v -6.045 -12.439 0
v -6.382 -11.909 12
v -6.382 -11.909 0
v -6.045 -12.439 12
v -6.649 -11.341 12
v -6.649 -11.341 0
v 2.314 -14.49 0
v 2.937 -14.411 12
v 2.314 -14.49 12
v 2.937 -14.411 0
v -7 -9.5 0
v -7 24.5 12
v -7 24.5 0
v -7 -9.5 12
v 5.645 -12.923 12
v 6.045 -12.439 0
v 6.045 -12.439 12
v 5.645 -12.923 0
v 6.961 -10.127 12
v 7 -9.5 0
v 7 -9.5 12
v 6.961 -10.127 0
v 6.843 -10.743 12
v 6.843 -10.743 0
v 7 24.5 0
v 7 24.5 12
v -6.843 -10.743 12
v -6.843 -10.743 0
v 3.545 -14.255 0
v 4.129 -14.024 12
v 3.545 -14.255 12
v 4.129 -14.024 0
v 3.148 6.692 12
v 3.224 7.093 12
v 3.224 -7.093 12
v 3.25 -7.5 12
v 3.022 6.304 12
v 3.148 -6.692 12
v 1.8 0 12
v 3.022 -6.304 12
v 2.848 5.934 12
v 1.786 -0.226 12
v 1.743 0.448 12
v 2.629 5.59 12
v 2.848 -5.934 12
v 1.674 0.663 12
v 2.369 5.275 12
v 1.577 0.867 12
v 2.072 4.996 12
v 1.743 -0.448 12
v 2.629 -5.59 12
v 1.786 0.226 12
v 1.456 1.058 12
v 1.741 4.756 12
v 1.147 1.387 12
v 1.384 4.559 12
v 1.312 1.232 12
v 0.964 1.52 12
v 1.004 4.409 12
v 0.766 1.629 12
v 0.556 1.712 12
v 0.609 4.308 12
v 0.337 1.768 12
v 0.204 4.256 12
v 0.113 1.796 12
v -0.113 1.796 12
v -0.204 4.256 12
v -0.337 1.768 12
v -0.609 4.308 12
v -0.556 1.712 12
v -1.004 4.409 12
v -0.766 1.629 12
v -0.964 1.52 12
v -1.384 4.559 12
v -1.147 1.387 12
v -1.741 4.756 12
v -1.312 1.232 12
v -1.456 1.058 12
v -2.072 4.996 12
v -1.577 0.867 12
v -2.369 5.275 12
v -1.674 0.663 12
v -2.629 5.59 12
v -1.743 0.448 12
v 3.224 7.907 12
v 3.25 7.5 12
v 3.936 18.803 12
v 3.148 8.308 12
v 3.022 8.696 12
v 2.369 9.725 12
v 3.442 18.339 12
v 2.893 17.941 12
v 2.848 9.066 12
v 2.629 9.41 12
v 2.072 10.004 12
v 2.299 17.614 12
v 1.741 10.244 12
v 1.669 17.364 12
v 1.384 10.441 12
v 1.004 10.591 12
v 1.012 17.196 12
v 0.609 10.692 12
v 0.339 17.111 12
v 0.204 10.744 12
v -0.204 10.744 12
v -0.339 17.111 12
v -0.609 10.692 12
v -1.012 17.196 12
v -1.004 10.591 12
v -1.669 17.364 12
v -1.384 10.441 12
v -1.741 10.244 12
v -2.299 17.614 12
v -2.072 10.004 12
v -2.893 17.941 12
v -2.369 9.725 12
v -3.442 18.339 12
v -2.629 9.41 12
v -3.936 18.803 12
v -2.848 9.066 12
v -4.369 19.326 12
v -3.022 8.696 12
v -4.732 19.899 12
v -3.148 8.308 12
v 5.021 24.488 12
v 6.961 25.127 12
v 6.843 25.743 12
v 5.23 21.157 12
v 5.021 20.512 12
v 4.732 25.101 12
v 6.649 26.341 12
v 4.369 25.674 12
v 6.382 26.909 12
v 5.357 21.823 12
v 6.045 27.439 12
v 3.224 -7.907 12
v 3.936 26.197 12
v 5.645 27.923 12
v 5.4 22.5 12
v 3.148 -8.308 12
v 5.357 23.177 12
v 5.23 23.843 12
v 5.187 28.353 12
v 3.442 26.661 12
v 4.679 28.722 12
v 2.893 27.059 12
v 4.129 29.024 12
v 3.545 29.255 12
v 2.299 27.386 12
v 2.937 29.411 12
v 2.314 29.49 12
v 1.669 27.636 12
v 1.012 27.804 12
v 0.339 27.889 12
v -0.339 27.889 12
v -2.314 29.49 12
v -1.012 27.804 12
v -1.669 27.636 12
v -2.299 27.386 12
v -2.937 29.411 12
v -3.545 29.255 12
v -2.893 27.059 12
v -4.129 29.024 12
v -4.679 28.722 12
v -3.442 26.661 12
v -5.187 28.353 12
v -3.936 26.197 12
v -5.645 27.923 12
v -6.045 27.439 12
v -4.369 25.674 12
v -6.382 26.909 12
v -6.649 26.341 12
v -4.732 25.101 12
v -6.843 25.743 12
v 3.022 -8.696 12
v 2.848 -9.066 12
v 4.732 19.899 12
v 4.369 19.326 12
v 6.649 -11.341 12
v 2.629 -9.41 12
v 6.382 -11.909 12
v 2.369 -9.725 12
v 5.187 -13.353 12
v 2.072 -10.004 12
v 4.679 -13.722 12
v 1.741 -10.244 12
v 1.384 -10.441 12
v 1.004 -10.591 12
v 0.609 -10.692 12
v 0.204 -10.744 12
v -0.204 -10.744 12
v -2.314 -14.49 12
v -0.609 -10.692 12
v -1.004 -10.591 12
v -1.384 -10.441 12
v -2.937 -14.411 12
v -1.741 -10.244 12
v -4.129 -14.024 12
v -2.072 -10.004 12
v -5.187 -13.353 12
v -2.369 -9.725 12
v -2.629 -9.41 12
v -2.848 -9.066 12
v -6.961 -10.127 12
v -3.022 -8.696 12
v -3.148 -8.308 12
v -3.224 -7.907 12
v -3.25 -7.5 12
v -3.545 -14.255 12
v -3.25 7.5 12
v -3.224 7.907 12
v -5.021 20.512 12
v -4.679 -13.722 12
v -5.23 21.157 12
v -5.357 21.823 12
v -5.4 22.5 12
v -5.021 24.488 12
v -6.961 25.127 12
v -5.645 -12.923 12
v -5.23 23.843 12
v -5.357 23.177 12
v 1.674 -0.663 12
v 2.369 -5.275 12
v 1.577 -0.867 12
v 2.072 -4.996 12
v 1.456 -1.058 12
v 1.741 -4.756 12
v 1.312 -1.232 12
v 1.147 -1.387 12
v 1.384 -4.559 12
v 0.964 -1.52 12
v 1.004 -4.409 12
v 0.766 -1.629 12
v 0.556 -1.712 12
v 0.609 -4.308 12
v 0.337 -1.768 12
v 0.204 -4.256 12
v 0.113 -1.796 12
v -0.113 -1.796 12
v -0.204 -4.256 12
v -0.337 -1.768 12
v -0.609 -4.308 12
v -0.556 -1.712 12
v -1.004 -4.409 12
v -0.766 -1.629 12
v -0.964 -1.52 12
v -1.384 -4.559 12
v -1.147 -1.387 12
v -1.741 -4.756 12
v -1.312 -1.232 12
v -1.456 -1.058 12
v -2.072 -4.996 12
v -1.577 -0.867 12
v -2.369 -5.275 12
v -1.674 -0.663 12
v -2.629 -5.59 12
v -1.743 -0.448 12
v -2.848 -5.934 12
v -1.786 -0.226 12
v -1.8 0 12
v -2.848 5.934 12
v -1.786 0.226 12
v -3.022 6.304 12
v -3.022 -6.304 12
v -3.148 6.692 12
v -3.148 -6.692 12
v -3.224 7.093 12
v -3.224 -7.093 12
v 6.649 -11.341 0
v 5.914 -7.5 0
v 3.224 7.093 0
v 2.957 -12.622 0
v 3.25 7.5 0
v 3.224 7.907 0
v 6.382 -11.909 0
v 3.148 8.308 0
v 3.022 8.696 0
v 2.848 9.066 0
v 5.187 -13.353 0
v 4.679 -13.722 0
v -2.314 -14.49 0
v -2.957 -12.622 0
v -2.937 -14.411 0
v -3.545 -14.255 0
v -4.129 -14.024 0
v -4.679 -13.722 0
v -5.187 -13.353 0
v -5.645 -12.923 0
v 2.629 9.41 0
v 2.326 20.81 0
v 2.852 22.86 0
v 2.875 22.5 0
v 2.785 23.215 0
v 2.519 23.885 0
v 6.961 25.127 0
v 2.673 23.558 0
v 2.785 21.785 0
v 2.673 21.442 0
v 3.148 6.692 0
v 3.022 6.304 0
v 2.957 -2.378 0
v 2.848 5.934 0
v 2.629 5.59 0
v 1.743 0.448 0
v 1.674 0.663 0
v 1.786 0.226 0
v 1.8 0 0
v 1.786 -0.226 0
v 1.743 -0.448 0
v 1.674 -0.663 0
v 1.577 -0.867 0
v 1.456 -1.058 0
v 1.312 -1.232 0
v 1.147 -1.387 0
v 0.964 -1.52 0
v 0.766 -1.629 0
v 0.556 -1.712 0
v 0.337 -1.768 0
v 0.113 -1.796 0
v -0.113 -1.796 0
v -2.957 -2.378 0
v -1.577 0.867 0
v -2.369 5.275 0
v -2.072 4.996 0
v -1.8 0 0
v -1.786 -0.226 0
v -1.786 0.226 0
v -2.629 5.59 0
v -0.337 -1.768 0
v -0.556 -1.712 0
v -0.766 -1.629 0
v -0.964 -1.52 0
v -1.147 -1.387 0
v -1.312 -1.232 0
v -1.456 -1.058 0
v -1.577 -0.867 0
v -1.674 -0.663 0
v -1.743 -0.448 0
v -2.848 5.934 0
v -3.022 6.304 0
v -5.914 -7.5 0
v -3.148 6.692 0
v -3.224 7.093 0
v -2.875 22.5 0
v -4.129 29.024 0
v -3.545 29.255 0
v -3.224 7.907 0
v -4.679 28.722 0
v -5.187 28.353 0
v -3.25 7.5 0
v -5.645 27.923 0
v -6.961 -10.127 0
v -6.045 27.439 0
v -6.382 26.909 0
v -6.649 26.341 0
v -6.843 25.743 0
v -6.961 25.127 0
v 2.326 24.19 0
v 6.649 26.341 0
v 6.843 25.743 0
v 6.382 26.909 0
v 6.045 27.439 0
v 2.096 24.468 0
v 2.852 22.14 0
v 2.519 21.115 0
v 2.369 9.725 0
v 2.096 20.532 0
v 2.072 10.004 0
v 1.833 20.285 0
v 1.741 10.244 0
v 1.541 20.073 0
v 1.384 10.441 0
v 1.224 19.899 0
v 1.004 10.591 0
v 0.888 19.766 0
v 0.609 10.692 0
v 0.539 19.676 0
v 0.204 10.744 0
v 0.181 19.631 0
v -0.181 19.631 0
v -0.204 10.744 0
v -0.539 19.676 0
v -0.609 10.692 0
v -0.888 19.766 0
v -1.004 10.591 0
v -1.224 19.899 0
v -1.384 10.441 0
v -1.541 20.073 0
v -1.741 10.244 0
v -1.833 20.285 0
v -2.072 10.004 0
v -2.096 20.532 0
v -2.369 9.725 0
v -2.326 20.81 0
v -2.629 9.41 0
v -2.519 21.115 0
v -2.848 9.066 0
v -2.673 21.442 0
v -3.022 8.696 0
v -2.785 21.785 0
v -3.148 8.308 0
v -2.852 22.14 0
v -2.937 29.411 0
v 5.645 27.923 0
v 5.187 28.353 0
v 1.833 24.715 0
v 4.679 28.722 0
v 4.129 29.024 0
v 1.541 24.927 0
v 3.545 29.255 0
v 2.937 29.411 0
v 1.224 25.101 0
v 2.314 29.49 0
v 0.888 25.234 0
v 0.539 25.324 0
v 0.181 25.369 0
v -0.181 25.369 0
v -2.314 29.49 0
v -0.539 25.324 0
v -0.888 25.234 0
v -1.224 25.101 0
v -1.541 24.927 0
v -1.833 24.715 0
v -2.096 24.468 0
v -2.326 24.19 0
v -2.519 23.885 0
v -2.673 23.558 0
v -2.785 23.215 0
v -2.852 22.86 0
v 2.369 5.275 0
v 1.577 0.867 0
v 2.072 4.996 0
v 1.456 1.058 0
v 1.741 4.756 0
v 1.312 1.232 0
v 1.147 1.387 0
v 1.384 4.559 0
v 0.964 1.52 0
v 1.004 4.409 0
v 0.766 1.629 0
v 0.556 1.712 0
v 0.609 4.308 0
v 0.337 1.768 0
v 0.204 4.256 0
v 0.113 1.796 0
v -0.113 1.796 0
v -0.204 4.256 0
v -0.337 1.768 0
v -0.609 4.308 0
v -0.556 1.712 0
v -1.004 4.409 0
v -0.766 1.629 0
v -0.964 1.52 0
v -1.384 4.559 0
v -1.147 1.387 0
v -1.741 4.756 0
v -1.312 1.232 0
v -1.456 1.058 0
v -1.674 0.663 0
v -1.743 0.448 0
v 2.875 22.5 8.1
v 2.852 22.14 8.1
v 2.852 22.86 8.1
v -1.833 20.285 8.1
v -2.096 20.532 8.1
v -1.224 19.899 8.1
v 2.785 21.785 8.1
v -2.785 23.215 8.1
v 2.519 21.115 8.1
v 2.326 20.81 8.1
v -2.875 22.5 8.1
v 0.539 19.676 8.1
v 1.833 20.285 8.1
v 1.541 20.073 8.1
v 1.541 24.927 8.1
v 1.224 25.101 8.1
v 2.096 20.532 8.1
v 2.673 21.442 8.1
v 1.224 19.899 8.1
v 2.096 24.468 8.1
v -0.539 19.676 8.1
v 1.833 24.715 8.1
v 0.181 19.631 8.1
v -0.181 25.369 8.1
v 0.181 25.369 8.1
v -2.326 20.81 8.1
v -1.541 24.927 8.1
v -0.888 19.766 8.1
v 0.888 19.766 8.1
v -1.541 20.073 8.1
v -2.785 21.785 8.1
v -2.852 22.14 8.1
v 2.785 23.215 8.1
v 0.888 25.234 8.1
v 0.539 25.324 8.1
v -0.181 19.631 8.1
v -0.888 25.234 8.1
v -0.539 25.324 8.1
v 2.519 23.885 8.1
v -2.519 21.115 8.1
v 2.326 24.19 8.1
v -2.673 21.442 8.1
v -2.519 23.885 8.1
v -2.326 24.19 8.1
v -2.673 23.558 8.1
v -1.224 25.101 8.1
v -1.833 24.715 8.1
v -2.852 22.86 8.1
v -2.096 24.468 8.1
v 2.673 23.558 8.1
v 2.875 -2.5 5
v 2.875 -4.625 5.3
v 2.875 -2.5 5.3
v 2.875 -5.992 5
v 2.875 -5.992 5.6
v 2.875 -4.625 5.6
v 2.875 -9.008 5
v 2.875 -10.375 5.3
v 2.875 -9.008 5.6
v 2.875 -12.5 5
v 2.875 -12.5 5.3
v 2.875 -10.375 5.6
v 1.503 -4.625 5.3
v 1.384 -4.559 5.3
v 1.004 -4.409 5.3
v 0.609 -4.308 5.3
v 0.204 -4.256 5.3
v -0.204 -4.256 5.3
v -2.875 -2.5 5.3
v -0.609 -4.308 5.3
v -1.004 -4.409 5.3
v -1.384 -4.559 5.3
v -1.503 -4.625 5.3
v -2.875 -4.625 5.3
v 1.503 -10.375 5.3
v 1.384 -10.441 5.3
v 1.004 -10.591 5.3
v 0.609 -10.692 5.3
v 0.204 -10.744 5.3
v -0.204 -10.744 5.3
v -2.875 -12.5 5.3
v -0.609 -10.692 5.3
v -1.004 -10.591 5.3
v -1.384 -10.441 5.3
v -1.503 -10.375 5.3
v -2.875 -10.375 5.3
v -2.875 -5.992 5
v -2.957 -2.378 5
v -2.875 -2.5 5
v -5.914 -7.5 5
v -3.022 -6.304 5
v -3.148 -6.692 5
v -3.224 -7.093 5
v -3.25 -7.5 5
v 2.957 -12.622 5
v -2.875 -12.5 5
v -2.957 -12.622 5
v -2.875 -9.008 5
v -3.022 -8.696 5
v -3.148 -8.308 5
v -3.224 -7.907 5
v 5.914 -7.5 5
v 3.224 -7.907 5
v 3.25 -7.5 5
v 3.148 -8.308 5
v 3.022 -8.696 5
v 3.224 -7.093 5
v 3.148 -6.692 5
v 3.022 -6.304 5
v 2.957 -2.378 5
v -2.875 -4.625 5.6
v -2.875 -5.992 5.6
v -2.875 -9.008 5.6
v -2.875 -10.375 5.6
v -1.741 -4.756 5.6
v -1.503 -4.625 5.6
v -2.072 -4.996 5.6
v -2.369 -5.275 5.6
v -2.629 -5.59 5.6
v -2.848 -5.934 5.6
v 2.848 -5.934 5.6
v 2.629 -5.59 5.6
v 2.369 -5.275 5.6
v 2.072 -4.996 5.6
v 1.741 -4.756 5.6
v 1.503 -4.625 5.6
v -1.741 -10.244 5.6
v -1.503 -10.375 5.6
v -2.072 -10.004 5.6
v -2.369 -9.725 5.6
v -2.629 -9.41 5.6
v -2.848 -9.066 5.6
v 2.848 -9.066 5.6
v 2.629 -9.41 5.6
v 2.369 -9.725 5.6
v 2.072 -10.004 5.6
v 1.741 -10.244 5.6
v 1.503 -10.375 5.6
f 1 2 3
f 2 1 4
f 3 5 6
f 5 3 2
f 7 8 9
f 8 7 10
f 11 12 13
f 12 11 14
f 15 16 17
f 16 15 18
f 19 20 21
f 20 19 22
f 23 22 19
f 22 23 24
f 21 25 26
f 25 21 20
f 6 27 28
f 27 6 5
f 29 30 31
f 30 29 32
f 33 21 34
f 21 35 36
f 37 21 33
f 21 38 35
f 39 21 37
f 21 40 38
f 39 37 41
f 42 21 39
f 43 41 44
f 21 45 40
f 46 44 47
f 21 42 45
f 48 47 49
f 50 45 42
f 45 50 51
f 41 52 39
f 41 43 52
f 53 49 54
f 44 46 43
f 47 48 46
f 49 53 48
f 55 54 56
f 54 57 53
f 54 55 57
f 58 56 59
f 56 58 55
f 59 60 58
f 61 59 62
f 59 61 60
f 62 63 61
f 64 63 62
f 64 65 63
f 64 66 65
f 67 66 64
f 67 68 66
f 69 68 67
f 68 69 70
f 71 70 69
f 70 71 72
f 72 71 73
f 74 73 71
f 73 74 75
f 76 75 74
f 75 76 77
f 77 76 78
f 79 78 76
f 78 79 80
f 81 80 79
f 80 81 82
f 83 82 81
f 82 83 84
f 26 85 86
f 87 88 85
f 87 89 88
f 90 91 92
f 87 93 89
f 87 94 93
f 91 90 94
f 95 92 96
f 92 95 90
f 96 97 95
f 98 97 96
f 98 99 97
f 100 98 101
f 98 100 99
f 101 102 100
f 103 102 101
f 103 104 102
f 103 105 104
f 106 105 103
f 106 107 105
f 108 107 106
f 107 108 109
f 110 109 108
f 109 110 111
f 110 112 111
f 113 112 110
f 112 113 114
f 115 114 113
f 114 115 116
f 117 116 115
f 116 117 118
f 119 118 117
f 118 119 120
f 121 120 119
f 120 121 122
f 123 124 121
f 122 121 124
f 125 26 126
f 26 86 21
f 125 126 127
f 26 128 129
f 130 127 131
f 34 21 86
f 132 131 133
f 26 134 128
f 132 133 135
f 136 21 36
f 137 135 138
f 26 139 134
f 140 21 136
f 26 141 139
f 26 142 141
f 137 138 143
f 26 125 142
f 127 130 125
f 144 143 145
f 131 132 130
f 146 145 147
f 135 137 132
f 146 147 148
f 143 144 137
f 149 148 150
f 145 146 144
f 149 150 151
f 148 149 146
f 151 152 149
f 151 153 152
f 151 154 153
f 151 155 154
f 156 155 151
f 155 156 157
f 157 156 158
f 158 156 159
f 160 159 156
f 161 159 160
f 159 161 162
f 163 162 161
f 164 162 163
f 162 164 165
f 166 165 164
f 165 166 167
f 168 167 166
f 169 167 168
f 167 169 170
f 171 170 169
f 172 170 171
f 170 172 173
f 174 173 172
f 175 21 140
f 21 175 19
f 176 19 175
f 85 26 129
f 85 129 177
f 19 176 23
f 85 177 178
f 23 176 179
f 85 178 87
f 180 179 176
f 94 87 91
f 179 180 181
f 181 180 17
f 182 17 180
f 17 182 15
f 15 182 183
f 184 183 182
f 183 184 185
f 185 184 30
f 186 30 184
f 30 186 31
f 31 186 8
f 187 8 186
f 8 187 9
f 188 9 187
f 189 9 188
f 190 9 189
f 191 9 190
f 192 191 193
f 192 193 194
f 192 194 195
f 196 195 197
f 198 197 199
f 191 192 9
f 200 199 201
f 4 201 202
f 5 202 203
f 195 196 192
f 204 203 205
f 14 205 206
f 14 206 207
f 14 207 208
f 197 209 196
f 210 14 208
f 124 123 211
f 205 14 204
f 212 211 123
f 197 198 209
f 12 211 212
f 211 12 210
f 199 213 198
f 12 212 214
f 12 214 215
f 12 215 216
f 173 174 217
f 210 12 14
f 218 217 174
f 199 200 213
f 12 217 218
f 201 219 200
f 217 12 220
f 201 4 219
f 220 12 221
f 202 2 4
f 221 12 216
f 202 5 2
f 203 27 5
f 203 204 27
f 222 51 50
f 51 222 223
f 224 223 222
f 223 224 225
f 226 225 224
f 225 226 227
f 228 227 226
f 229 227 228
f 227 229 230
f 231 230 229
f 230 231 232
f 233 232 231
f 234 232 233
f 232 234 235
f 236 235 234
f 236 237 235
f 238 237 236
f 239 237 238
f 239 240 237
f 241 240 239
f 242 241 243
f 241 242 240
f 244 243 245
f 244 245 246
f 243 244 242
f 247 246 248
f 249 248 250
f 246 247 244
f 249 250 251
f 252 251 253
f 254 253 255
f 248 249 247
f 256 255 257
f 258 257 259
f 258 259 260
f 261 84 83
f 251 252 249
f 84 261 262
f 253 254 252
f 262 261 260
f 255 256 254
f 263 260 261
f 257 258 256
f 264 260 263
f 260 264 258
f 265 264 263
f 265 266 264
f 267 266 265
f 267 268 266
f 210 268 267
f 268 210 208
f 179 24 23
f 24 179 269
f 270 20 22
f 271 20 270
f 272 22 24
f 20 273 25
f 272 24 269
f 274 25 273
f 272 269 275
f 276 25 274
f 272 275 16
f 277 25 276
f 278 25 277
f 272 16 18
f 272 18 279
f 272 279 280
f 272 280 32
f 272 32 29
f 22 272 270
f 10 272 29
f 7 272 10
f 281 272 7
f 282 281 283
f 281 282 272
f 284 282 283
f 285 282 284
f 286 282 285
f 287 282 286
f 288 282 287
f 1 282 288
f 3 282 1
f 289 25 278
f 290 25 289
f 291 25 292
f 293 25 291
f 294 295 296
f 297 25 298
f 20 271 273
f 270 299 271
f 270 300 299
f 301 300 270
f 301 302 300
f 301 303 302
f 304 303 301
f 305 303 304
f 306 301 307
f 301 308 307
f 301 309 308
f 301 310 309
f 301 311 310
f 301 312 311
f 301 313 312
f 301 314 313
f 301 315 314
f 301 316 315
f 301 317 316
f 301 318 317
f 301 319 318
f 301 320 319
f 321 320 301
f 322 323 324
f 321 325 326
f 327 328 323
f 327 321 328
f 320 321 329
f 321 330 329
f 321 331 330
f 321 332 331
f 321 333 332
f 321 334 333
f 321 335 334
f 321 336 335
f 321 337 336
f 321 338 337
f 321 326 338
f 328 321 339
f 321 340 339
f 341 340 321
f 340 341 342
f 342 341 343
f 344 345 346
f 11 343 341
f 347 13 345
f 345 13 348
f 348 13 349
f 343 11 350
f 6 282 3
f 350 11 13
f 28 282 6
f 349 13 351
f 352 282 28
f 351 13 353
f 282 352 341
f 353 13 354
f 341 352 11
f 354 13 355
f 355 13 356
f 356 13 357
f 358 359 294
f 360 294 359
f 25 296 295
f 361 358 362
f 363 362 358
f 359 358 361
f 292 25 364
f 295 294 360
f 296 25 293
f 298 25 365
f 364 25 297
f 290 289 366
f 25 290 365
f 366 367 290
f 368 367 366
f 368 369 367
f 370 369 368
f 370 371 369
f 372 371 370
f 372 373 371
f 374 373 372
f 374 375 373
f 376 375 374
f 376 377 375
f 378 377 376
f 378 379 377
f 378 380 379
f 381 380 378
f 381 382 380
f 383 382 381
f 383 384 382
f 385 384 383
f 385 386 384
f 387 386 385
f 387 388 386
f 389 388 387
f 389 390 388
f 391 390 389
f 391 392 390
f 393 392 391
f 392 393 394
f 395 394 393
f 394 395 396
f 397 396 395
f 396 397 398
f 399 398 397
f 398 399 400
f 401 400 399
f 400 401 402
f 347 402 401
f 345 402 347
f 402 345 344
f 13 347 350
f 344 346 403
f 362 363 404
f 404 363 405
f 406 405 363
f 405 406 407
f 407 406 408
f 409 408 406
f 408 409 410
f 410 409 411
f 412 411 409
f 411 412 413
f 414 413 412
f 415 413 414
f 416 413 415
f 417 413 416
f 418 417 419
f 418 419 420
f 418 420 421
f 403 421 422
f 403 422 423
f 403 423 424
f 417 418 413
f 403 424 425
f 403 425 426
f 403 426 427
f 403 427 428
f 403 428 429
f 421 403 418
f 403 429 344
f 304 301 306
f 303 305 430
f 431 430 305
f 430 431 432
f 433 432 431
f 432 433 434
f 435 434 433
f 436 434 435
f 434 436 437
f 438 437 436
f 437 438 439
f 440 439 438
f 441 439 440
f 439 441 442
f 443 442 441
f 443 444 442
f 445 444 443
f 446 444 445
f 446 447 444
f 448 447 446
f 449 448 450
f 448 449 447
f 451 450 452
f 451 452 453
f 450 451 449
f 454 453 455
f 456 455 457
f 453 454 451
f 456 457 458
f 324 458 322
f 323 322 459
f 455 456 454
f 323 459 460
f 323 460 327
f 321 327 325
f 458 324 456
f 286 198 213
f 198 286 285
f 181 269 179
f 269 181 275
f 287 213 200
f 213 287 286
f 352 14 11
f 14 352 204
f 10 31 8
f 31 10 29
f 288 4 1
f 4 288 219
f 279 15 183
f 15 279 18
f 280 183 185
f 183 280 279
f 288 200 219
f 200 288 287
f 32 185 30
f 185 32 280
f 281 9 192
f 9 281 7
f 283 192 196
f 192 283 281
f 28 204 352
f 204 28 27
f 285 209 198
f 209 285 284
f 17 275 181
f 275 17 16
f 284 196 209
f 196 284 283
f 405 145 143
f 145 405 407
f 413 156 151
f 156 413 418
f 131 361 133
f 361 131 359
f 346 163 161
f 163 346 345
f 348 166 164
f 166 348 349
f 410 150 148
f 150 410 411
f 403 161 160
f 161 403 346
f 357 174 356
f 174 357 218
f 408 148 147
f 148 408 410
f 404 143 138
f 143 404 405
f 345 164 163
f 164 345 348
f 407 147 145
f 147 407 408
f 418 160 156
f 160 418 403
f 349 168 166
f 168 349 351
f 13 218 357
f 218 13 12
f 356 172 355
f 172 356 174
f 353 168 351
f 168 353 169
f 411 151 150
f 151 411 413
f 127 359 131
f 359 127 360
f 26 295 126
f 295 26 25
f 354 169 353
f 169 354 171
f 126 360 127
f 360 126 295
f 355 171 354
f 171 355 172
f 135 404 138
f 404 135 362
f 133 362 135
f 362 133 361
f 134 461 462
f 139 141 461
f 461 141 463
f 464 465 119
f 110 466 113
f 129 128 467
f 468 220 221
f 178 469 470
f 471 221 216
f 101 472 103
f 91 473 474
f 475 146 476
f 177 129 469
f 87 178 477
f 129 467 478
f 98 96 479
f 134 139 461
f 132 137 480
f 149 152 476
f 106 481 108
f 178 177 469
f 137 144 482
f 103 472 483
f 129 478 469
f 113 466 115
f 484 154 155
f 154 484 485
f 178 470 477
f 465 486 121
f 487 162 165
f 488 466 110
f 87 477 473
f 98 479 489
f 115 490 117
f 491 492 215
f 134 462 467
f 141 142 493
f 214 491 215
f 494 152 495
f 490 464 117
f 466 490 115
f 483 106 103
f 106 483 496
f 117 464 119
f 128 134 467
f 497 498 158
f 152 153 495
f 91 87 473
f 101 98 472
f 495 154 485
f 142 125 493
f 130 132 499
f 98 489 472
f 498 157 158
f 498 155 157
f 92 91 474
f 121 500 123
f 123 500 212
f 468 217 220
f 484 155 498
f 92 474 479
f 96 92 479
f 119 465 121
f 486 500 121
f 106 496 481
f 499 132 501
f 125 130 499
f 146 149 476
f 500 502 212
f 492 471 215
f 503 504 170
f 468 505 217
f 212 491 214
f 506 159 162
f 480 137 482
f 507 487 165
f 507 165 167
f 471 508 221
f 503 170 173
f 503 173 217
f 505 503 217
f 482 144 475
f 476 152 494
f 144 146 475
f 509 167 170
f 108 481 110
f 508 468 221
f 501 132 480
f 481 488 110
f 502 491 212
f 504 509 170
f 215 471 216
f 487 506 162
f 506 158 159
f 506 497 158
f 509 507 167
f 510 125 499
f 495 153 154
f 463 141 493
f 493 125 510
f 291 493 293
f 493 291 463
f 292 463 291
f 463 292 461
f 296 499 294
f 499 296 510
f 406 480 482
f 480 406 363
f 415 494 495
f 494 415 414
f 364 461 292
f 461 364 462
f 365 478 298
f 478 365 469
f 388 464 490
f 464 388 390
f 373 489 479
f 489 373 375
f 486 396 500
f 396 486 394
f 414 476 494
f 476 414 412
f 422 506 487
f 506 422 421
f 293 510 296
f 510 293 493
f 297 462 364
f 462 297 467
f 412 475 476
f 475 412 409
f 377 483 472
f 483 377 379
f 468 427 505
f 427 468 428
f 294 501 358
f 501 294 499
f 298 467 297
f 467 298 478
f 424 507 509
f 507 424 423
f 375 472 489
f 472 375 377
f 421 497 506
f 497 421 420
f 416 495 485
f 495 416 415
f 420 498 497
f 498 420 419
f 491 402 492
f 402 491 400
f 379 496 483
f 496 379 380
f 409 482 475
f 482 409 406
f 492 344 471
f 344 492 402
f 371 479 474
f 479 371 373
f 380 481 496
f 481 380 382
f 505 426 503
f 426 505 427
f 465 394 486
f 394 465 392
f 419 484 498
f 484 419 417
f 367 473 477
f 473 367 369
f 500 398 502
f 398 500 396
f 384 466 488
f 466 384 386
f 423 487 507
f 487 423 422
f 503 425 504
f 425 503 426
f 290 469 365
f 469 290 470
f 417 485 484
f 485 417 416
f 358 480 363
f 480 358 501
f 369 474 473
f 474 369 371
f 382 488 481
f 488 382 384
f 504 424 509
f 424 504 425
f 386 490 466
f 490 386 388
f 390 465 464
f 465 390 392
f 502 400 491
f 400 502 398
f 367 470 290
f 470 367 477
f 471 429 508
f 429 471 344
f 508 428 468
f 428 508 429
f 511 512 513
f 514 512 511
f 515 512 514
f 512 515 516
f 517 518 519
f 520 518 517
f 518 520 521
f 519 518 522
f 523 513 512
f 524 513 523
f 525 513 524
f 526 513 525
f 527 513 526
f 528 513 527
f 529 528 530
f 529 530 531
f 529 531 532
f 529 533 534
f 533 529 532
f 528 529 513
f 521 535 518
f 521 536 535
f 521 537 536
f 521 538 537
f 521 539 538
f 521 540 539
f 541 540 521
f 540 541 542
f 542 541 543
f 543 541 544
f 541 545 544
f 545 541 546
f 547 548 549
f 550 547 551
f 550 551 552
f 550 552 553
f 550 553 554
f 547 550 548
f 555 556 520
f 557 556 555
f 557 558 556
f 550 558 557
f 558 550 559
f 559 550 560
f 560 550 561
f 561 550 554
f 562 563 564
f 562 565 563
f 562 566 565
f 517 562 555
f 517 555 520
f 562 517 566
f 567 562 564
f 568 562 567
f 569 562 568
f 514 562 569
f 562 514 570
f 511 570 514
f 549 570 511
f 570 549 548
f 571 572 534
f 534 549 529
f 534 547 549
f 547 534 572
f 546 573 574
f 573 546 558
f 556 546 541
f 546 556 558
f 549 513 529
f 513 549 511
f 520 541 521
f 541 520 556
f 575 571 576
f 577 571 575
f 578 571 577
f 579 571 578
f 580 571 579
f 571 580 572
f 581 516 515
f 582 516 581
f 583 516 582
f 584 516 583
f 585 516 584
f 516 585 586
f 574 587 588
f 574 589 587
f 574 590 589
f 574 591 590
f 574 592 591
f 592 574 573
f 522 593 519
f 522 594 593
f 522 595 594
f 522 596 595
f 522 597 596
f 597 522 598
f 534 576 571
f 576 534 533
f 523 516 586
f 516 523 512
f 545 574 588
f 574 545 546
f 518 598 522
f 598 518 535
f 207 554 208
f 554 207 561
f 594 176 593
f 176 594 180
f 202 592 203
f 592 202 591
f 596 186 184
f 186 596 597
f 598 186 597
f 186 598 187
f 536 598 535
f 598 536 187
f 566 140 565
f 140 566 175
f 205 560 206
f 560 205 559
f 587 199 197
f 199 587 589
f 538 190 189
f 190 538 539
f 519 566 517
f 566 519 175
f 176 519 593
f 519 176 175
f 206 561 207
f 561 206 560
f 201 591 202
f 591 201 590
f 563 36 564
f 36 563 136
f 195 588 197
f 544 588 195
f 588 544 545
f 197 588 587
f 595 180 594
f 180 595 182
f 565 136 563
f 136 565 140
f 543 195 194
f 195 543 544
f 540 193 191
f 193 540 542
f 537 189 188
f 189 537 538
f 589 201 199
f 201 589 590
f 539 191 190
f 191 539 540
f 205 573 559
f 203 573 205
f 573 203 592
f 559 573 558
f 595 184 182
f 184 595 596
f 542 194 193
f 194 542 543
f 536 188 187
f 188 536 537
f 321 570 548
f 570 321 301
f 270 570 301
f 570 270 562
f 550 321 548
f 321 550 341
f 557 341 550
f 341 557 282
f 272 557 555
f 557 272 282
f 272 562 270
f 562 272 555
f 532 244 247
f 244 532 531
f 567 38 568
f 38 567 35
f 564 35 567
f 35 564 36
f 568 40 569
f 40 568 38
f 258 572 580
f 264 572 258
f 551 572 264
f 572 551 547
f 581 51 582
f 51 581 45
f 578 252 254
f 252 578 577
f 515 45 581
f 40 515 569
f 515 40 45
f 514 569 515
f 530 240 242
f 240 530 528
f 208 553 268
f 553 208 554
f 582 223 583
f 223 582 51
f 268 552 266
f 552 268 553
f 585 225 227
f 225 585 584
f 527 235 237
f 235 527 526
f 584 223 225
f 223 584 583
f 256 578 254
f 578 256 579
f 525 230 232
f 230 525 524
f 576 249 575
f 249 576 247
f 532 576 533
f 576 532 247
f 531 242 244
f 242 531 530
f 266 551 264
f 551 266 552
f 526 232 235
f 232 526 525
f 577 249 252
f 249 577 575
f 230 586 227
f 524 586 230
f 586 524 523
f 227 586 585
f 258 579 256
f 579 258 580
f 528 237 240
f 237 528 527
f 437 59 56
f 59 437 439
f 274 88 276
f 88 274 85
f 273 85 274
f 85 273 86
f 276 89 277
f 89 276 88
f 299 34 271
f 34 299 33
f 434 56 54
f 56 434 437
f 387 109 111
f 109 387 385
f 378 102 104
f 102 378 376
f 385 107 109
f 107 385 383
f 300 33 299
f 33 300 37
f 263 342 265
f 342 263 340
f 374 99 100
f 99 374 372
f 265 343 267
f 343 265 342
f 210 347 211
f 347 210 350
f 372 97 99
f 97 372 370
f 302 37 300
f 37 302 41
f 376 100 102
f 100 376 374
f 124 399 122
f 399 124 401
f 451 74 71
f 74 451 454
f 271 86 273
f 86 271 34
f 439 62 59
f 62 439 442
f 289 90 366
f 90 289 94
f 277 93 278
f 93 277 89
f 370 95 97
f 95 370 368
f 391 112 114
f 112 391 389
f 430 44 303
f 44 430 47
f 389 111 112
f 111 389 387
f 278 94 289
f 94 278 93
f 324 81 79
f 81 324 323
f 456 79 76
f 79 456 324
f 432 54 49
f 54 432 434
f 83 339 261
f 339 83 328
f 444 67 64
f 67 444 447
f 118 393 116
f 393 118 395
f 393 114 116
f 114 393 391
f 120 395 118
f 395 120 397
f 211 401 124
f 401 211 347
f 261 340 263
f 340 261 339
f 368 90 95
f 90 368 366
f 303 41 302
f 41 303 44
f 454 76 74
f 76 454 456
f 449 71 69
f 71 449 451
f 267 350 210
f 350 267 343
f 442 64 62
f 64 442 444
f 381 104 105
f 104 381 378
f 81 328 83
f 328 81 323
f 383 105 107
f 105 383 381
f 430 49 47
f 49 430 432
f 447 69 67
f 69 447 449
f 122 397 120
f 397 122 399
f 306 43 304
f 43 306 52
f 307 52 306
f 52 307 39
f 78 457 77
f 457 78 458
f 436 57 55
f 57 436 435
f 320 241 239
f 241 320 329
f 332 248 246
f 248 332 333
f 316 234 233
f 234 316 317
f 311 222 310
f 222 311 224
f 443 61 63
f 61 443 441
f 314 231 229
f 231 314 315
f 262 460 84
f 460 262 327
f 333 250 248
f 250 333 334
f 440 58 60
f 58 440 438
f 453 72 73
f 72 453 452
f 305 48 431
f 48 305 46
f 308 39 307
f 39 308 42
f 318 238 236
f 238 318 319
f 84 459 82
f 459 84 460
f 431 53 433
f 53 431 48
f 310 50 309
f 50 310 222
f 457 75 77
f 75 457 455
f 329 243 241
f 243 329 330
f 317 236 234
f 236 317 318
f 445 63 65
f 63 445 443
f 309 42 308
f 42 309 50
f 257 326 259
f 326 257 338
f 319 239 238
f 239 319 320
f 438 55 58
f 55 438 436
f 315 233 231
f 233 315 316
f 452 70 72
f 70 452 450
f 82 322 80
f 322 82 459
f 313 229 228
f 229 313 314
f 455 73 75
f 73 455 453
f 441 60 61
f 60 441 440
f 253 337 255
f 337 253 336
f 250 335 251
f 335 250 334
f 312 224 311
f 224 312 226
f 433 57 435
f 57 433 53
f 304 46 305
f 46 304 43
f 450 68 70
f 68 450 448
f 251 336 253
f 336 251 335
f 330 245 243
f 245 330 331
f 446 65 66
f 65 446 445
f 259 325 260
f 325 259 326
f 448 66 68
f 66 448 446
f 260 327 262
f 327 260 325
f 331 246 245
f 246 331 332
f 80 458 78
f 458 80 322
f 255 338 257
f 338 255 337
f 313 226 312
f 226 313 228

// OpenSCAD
$fn = 50;


difference() {
	union() {
		hull() {
			translate(v = [-2.0000000000, 9.5000000000, 0]) {
				cylinder(h = 12, r = 5);
			}
			translate(v = [2.0000000000, 9.5000000000, 0]) {
				cylinder(h = 12, r = 5);
			}
			translate(v = [-2.0000000000, -9.5000000000, 0]) {
				cylinder(h = 12, r = 5);
			}
			translate(v = [2.0000000000, -9.5000000000, 0]) {
				cylinder(h = 12, r = 5);
			}
		}
		translate(v = [0.0000000000, 15.0000000000, 0]) {
			hull() {
				translate(v = [-2.0000000000, 9.5000000000, 0]) {
					cylinder(h = 12, r = 5);
				}
				translate(v = [2.0000000000, 9.5000000000, 0]) {
					cylinder(h = 12, r = 5);
				}
				translate(v = [-2.0000000000, -9.5000000000, 0]) {
					cylinder(h = 12, r = 5);
				}
				translate(v = [2.0000000000, -9.5000000000, 0]) {
					cylinder(h = 12, r = 5);
				}
			}
		}
		translate(v = [0.0000000000, 15.0000000000, 0]) {
			hull() {
				translate(v = [-2.0000000000, 9.5000000000, 0]) {
					cylinder(h = 12, r = 5);
				}
				translate(v = [2.0000000000, 9.5000000000, 0]) {
					cylinder(h = 12, r = 5);
				}
				translate(v = [-2.0000000000, -9.5000000000, 0]) {
					cylinder(h = 12, r = 5);
				}
				translate(v = [2.0000000000, -9.5000000000, 0]) {
					cylinder(h = 12, r = 5);
				}
			}
		}
	}
	union() {
		translate(v = [0.0000000000, 22.5000000000, 12]) {
			rotate(a = [0, 0, 0]) {
				difference() {
					union() {
						#translate(v = [0, 0, -12.0000000000]) {
							cylinder(h = 12, r = 2.6000000000);
						}
						#translate(v = [0, 0, -3.9000000000]) {
							cylinder(h = 3.9000000000, r1 = 2.8750000000, r2 = 5.4000000000);
						}
						#translate(v = [0, 0, -12.0000000000]) {
							cylinder(h = 12, r = 2.8750000000);
						}
						#translate(v = [0, 0, -12.0000000000]) {
							cylinder(h = 12, r = 2.6000000000);
						}
					}
					union();
				}
			}
		}
		translate(v = [0.0000000000, 22.5000000000, 12]) {
			rotate(a = [0, 0, 0]) {
				difference() {
					union() {
						#translate(v = [0, 0, -12.0000000000]) {
							cylinder(h = 12, r = 2.6000000000);
						}
						#translate(v = [0, 0, -3.9000000000]) {
							cylinder(h = 3.9000000000, r1 = 2.8750000000, r2 = 5.4000000000);
						}
						#translate(v = [0, 0, -12.0000000000]) {
							cylinder(h = 12, r = 2.8750000000);
						}
						#translate(v = [0, 0, -12.0000000000]) {
							cylinder(h = 12, r = 2.6000000000);
						}
					}
					union();
				}
			}
		}
		translate(v = [0.0000000000, -7.5000000000, 0]) {
			rotate(a = [0, 0, 0]) {
				difference() {
					union() {
						#translate(v = [-2.8750000000, -5.0000000000, -0.3000000000]) {
							cube(size = [5.7500000000, 10, 0.3000000000]);
						}
						#translate(v = [-2.8750000000, -2.8750000000, -0.6000000000]) {
							cube(size = [5.7500000000, 5.7500000000, 0.3000000000]);
						}
						#translate(v = [-2.8750000000, -5.0000000000, 5]) {
							cube(size = [5.7500000000, 10, 0.3000000000]);
						}
						#translate(v = [-2.8750000000, -2.8750000000, 5.3000000000]) {
							cube(size = [5.7500000000, 5.7500000000, 0.3000000000]);
						}
						#translate(v = [0, 0, -100.0000000000]) {
							cylinder(h = 200, r = 3.2500000000);
						}
						#linear_extrude(height = 5) {
							polygon(points = [[5.9142500000, 0.0000000000], [2.9571250000, 5.1218907443], [-2.9571250000, 5.1218907443], [-5.9142500000, 0.0000000000], [-2.9571250000, -5.1218907443], [2.9571250000, -5.1218907443]]);
						}
						#translate(v = [-2.8750000000, -5.0000000000, -0.3000000000]) {
							cube(size = [5.7500000000, 10, 0.3000000000]);
						}
						#translate(v = [-2.8750000000, -2.8750000000, -0.6000000000]) {
							cube(size = [5.7500000000, 5.7500000000, 0.3000000000]);
						}
						#translate(v = [-2.8750000000, -5.0000000000, 5]) {
							cube(size = [5.7500000000, 10, 0.3000000000]);
						}
						#translate(v = [-2.8750000000, -2.8750000000, 5.3000000000]) {
							cube(size = [5.7500000000, 5.7500000000, 0.3000000000]);
						}
						#translate(v = [0, 0, -100.0000000000]) {
							cylinder(h = 200, r = 3.2500000000);
						}
						#translate(v = [-2.8750000000, -5.0000000000, -0.3000000000]) {
							cube(size = [5.7500000000, 10, 0.3000000000]);
						}
						#translate(v = [-2.8750000000, -2.8750000000, -0.6000000000]) {
							cube(size = [5.7500000000, 5.7500000000, 0.3000000000]);
						}
						#translate(v = [-2.8750000000, -5.0000000000, 5]) {
							cube(size = [5.7500000000, 10, 0.3000000000]);
						}
						#translate(v = [-2.8750000000, -2.8750000000, 5.3000000000]) {
							cube(size = [5.7500000000, 5.7500000000, 0.3000000000]);
						}
						#translate(v = [0, 0, -100.0000000000]) {
							cylinder(h = 200, r = 3.2500000000);
						}
					}
					union();
				}
			}
		}
		translate(v = [0.0000000000, -7.5000000000, 0]) {
			translate(v = [0, 0, -100]) {
				cylinder(h = 200, r = 3.2500000000);
			}
		}
		translate(v = [0.0000000000, 7.5000000000, 0]) {
			translate(v = [0, 0, -100]) {
				cylinder(h = 200, r = 3.2500000000);
			}
		}
		translate(v = [0.0000000000, -7.5000000000, 0]) {
			translate(v = [0, 0, -100]) {
				cylinder(h = 200, r = 1.8000000000);
			}
		}
		translate(v = [0, 0, -100]) {
			cylinder(h = 200, r = 1.8000000000);
		}
		translate(v = [0.0000000000, 7.5000000000, 0]) {
			translate(v = [0, 0, -100]) {
				cylinder(h = 200, r = 1.8000000000);
			}
		}
	}
}
